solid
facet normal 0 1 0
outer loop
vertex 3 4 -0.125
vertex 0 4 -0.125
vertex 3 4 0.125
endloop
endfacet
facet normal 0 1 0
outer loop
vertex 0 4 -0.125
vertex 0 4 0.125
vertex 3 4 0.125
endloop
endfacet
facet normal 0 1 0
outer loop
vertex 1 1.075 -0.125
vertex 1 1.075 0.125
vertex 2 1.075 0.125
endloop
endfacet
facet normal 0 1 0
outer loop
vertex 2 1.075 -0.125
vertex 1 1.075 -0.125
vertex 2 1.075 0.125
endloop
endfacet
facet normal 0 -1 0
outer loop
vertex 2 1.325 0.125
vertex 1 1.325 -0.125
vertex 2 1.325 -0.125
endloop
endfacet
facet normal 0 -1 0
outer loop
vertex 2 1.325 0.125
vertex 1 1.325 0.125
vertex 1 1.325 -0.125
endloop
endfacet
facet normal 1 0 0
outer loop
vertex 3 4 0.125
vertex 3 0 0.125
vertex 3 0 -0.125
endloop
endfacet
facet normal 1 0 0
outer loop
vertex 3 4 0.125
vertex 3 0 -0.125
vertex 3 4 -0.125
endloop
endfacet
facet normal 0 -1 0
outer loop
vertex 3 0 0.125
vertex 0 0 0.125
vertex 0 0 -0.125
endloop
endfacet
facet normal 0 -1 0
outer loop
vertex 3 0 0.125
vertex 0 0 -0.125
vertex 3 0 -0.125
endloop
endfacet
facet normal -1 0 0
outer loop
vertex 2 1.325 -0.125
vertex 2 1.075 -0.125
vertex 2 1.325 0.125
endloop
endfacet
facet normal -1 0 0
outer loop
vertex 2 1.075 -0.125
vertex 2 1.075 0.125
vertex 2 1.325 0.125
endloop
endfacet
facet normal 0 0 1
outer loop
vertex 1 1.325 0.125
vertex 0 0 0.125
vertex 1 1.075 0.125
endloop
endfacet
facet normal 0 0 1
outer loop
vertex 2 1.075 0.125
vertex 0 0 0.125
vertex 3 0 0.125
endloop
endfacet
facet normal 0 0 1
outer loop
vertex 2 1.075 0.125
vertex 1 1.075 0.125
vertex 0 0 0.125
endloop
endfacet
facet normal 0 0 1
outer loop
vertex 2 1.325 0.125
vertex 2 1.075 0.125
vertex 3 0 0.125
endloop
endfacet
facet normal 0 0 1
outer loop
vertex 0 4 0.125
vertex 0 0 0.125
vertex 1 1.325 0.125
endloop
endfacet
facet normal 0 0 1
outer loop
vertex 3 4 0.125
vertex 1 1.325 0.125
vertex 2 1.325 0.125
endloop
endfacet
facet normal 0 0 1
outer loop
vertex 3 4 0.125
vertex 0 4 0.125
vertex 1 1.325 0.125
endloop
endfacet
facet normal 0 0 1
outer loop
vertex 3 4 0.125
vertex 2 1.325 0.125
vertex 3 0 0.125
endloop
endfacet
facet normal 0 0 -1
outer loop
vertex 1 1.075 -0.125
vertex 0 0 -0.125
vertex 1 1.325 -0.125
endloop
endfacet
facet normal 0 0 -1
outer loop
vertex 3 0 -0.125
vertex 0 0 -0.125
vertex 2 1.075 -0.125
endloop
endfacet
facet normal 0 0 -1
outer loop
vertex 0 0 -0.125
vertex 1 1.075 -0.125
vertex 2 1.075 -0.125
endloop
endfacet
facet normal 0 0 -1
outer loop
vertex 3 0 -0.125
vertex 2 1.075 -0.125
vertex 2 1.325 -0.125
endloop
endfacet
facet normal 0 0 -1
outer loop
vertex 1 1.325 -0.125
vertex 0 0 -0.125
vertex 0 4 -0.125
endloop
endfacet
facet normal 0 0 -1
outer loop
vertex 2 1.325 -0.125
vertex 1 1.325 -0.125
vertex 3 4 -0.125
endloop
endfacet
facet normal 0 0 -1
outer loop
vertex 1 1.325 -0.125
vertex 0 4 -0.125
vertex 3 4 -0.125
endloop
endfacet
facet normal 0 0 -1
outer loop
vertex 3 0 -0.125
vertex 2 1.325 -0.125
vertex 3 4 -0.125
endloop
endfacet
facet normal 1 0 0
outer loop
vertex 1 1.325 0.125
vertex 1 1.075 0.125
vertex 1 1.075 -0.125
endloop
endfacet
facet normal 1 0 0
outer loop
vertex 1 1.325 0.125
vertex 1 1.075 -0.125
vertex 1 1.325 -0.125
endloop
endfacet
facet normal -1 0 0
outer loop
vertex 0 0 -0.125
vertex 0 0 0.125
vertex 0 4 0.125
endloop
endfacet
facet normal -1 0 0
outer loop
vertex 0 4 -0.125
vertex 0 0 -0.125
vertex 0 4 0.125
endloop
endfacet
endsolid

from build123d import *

# Parameters (mm, degrees)
FRAME_OUTLINE_W     = 3
FRAME_OUTLINE_H     = 4
FRAME_OUTLINE_W_2   = 1
FRAME_OUTLINE_H_2   = 0.25
BOSS_EXTRUDE1_DEPTH = 0.125


with BuildPart() as part:
    # frame_outline → Boss-Extrude1 (new, symmetric)
    with BuildSketch(Plane.XY):
        with Locations((1.5, 2)):
            Rectangle(FRAME_OUTLINE_W, FRAME_OUTLINE_H)
        with Locations((1.5, 1.2)):
            Rectangle(FRAME_OUTLINE_W_2, FRAME_OUTLINE_H_2, mode=Mode.SUBTRACT)
    extrude(amount=BOSS_EXTRUDE1_DEPTH, both=True)


solid = part.part
